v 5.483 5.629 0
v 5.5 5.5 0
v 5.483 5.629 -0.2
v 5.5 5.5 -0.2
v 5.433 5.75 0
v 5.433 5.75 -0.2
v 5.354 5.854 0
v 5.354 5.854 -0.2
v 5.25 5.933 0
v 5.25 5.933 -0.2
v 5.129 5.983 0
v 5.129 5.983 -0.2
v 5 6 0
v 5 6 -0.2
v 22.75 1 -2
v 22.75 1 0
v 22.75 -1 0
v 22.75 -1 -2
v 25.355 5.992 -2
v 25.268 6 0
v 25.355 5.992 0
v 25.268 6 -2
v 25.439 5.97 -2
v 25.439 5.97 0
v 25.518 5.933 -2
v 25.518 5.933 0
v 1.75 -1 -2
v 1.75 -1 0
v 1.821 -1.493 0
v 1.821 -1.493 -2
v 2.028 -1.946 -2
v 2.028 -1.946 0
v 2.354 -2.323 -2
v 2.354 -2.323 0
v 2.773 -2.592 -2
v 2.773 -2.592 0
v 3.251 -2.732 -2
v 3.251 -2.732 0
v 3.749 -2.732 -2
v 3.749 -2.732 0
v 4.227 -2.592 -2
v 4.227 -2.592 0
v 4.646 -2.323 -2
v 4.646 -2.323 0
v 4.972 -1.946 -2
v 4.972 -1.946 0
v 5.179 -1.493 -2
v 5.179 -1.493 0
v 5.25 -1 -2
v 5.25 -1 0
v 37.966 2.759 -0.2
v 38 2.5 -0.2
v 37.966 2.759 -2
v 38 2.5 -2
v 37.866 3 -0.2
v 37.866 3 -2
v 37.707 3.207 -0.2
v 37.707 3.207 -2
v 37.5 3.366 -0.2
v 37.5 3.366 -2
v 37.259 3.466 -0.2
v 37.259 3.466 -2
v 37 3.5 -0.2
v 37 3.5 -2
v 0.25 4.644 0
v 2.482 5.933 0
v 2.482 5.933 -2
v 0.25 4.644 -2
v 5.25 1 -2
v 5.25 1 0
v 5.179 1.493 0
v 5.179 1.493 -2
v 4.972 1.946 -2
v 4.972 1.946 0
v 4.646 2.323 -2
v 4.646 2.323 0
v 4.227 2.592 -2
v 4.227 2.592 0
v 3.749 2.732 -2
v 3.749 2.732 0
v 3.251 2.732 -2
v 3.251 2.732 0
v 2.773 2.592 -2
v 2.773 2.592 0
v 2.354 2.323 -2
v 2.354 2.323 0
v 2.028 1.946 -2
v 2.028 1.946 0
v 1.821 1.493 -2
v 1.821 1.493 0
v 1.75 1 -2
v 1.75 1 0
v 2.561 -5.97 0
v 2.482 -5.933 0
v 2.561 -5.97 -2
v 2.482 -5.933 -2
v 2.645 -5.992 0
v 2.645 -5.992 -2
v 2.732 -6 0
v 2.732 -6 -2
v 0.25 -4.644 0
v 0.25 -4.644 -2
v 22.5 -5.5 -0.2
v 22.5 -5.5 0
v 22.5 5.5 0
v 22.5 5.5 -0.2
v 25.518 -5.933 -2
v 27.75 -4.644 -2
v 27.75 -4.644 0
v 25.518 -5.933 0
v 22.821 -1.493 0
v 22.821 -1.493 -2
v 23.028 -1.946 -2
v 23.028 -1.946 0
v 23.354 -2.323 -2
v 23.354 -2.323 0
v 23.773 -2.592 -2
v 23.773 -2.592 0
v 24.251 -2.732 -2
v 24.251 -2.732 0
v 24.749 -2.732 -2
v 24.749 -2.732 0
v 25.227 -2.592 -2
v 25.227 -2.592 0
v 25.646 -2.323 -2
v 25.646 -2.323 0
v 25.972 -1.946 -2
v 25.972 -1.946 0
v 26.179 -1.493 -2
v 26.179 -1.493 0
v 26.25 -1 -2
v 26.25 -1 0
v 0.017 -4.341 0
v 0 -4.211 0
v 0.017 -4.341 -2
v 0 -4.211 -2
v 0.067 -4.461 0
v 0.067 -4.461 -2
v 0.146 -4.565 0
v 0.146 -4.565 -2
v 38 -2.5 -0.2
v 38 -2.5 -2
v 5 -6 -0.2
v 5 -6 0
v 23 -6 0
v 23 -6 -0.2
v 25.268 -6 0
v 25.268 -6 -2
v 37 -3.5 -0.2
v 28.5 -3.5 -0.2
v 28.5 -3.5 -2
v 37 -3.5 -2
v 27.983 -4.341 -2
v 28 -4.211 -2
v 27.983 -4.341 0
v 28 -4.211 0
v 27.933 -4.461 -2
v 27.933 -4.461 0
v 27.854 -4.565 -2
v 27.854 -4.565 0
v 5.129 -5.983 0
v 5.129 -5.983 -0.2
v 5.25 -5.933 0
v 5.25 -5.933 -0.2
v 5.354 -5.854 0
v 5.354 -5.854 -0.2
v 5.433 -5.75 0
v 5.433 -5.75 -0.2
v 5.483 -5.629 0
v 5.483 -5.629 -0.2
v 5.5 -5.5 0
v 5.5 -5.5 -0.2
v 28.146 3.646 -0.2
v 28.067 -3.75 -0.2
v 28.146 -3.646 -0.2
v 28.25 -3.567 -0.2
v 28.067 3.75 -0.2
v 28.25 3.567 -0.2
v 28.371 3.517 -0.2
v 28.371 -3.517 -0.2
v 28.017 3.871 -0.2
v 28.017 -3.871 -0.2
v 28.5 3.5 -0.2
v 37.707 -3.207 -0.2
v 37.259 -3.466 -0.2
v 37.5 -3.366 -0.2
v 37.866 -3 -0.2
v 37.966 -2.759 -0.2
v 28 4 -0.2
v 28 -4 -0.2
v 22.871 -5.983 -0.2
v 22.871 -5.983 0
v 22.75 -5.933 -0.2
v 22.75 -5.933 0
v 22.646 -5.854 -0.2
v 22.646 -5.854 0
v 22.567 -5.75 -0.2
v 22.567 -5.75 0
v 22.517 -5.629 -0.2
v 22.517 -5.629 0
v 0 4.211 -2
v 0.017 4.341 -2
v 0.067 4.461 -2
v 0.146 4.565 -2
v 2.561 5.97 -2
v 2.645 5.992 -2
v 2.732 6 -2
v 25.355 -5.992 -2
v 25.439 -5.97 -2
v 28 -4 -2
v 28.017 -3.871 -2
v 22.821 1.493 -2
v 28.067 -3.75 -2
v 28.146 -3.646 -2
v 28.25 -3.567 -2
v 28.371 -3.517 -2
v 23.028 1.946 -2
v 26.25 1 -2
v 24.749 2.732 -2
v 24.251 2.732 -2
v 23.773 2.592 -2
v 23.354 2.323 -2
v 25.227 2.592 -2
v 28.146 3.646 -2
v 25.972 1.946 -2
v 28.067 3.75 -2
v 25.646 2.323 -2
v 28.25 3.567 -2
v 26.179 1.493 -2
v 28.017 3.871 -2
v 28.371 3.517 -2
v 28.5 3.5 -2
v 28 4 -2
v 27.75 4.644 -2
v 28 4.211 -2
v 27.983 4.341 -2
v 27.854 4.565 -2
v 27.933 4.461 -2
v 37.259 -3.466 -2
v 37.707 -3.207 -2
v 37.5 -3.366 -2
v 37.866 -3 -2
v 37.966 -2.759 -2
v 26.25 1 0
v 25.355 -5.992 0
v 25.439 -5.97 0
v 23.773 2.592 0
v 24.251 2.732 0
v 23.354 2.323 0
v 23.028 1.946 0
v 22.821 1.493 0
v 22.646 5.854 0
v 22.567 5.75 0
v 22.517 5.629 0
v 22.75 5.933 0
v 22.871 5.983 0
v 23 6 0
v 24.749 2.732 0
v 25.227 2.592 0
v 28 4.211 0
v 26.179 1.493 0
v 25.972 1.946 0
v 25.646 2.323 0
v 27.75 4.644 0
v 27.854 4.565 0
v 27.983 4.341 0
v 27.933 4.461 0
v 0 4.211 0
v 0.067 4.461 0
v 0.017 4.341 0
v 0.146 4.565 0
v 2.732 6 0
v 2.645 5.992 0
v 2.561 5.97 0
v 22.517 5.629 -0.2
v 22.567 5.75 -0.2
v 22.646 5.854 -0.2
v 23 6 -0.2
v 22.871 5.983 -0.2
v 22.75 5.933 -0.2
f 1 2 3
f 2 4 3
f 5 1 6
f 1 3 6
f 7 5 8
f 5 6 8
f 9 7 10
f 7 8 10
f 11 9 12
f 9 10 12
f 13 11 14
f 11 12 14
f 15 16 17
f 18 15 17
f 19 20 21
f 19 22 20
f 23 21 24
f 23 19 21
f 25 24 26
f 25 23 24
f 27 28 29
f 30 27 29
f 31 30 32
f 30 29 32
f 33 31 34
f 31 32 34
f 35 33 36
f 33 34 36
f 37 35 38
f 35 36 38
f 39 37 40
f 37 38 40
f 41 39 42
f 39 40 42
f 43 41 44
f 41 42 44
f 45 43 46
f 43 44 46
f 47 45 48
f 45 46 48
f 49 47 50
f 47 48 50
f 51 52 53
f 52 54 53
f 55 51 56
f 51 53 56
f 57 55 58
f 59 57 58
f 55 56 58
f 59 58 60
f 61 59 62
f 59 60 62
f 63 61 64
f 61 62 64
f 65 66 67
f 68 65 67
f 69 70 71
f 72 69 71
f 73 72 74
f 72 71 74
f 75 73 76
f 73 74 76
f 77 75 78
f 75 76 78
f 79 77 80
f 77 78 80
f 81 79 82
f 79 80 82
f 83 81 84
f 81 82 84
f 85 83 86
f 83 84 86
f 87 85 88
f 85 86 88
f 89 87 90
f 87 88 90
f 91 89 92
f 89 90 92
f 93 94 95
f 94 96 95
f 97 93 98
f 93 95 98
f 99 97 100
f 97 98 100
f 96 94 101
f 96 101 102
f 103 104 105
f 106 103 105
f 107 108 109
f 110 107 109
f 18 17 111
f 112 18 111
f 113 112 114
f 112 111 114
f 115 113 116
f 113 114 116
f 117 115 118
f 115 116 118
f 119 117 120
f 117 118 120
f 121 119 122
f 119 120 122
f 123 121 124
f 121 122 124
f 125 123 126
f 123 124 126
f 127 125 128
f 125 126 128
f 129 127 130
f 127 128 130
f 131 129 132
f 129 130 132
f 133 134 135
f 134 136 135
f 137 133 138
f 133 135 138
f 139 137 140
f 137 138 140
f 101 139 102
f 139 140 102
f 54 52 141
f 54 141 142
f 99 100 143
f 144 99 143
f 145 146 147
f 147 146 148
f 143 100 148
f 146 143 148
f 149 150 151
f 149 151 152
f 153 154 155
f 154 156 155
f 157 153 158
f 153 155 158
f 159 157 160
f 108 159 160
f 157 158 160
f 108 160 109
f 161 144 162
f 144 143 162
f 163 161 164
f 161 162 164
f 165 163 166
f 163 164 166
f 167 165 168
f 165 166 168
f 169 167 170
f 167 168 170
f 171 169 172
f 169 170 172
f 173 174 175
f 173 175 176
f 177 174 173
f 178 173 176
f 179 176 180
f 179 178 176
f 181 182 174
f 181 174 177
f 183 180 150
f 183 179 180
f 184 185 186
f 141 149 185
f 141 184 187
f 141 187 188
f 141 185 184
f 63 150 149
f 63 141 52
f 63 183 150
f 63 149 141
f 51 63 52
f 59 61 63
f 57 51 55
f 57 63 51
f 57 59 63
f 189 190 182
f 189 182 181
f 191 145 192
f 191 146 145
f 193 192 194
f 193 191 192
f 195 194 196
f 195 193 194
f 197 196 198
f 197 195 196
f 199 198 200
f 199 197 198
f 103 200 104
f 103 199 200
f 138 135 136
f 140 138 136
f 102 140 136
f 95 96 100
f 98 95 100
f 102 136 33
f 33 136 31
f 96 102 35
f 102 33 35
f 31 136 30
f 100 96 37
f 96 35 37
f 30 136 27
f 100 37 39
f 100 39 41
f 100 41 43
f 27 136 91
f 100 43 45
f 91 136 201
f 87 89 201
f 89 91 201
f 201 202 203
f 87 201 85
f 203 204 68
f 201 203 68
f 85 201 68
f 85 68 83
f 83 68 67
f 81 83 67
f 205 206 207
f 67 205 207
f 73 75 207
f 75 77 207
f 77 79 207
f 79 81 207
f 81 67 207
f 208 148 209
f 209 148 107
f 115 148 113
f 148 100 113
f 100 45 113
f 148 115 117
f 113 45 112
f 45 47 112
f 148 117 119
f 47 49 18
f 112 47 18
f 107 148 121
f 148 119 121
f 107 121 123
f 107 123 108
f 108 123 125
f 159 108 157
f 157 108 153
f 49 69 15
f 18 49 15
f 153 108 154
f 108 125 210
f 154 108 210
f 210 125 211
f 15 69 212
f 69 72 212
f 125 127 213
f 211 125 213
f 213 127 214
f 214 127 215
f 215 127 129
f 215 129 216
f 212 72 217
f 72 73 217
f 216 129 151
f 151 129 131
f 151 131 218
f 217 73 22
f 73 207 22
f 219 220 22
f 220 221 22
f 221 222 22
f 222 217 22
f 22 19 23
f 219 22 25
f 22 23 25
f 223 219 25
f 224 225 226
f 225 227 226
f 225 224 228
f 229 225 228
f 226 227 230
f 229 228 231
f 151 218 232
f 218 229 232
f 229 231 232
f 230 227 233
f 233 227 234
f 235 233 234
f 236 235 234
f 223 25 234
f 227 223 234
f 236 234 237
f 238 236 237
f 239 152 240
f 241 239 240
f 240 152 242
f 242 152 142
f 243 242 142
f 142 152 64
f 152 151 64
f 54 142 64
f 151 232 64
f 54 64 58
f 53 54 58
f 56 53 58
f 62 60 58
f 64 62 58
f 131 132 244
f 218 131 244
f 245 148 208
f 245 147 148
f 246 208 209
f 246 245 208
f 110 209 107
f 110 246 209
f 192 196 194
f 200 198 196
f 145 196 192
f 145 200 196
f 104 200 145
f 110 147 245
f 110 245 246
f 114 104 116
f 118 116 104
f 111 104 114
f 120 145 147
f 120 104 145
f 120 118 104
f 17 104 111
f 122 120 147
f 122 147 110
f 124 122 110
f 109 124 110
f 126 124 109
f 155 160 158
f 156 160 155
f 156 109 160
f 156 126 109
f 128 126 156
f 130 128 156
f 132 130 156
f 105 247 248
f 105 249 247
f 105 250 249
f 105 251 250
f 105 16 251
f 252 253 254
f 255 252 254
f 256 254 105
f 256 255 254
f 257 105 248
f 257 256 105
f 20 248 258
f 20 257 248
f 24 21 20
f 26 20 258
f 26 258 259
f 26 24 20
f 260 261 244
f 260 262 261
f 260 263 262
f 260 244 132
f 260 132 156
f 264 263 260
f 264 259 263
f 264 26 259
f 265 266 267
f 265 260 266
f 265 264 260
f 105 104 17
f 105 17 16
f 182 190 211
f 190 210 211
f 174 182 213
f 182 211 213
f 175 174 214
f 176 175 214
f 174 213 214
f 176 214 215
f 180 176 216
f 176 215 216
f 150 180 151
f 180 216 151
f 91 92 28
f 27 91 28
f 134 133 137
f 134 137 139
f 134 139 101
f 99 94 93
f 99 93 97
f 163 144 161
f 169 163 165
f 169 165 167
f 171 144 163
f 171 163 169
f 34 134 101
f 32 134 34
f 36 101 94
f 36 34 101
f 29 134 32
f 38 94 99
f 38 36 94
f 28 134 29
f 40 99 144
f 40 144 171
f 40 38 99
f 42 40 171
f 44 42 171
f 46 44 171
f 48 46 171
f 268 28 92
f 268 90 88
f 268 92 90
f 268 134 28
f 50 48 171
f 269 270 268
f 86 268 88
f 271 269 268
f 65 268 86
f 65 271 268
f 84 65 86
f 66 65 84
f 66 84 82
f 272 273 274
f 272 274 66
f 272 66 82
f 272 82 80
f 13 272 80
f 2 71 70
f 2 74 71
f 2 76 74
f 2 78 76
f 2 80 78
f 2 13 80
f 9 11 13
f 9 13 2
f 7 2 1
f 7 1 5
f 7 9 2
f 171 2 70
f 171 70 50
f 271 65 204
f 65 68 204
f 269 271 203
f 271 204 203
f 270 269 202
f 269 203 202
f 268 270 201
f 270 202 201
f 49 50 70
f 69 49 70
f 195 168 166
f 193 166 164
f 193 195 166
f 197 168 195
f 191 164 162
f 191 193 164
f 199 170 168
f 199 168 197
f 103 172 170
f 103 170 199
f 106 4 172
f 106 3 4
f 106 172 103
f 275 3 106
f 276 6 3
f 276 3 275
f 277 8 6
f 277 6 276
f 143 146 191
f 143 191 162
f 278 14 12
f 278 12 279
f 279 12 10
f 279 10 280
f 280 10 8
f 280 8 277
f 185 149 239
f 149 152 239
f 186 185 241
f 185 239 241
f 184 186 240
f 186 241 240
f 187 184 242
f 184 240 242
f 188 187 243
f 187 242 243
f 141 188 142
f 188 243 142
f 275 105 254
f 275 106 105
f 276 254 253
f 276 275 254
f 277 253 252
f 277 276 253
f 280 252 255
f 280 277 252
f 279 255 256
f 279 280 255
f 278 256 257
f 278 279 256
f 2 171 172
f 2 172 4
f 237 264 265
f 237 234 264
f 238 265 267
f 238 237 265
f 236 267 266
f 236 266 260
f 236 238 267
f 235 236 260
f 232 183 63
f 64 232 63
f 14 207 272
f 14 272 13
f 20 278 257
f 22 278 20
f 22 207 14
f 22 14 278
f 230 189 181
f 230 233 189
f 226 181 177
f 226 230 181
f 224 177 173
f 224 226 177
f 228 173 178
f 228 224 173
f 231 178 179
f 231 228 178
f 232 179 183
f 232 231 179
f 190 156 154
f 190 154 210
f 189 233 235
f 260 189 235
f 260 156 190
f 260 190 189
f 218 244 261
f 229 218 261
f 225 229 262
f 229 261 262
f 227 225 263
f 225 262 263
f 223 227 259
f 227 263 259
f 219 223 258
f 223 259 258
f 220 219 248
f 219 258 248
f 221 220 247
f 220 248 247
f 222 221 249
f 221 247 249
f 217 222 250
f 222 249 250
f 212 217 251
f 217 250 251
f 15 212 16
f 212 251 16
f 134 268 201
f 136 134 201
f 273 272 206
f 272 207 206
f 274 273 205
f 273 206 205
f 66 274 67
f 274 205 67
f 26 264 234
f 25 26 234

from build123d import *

# Parameters (mm, degrees)
CROQUIS4_W                   = 38
CROQUIS4_H                   = 2
SALIENTE_EXTRUIR1_DEPTH      = 6
SALIENTE_EXTRUIR1_DEPTH_BACK = 6
CROQUIS1_W                   = 10
CROQUIS1_H                   = 2.5
CORTAR_EXTRUIR2_DEPTH        = 10
CROQUIS5_W                   = 17
CROQUIS5_H                   = 12
CROQUIS5_W_2                 = 10
CORTAR_EXTRUIR3_DEPTH        = 0.2
REDONDEO1_R                  = 0.5
REDONDEO2_R                  = 0.5
REDONDEO4_R                  = 1
CHAFL_N1_SIZE                = 1.5
CHAFL_N1_SIZE2               = 2.598076211
CHAFL_N1_PART_2_SIZE         = 1.5
CHAFL_N1_PART_2_SIZE2        = 2.598076211
REDONDEO5_R                  = 0.5


with BuildPart() as part:
    # Croquis4 → Saliente-Extruir1 (new body, two sides)
    with BuildSketch(Plane(origin=(0, 0, 0), x_dir=(1, 0, 0), z_dir=(0, 1, 0))) as saliente_extruir1_sk:
        with Locations((19, 1)):
            Rectangle(CROQUIS4_W, CROQUIS4_H)
    extrude(amount=SALIENTE_EXTRUIR1_DEPTH)
    extrude(saliente_extruir1_sk.sketch, amount=-SALIENTE_EXTRUIR1_DEPTH_BACK)

    # Croquis1 → Cortar-Extruir2 (cut)
    with BuildSketch(Plane.XY):
        with Locations((33, 4.75)):
            Rectangle(CROQUIS1_W, CROQUIS1_H)
        with Locations((33, -4.75)):
            Rectangle(CROQUIS1_W, CROQUIS1_H)
        with BuildLine():
            Line((5.25, -1), (5.25, 1))
            ThreePointArc((5.25, 1), (3.5, 2.75), (1.75, 1))
            Line((1.75, 1), (1.75, -1))
            ThreePointArc((1.75, -1), (3.5, -2.75), (5.25, -1))
        make_face()
        with BuildLine():
            Line((22.75, 1), (22.75, -1))
            ThreePointArc((22.75, -1), (24.5, -2.75), (26.25, -1))
            Line((26.25, -1), (26.25, 1))
            ThreePointArc((26.25, 1), (24.5, 2.75), (22.75, 1))
        make_face()
    extrude(amount=-CORTAR_EXTRUIR2_DEPTH, mode=Mode.SUBTRACT)

    # Croquis5 → Cortar-Extruir3 (cut)
    with BuildSketch(Plane.XY):
        with Locations((14, 0)):
            Rectangle(CROQUIS5_W, CROQUIS5_H)
        with Locations((33, 0)):
            Rectangle(CROQUIS5_W_2, CROQUIS5_H)
    extrude(amount=-CORTAR_EXTRUIR3_DEPTH, mode=Mode.SUBTRACT)

    # Redondeo1
    redondeo1_edges = [part.edges().sort_by_distance(p)[0] for p in [
        (28, 3.5, -1.1),
        (28, -3.5, -1.1),
    ]]
    fillet(redondeo1_edges, radius=REDONDEO1_R)

    # Redondeo2
    redondeo2_edges = [part.edges().sort_by_distance(p)[0] for p in [
        (22.5, 6, -0.1),
        (22.5, -6, -0.1),
        (5.5, -6, -0.1),
        (5.5, 6, -0.1),
    ]]
    fillet(redondeo2_edges, radius=REDONDEO2_R)

    # Redondeo4
    redondeo4_edges = [part.edges().sort_by_distance(p)[0] for p in [
        (38, 3.5, -1.1),
        (38, -3.5, -1.1),
    ]]
    fillet(redondeo4_edges, radius=REDONDEO4_R)

    # Chaflán1
    chafl_n1_edges = [part.edges().sort_by_distance(p)[0] for p in [
        (0, -6, -1),
        (0, 6, -1),
    ]]
    chafl_n1_side = [part.faces().sort_by_distance(p)[0] for p in [
        (0, 0, -1),
    ]]
    chamfer(chafl_n1_edges, length=CHAFL_N1_SIZE, length2=CHAFL_N1_SIZE2, reference=chafl_n1_side[0])

    # Chaflán1 part 2
    chafl_n1_part_2_edges = [part.edges().sort_by_distance(p)[0] for p in [
        (28, 6, -1),
        (28, -6, -1),
    ]]
    chafl_n1_part_2_side = [part.faces().sort_by_distance(p)[0] for p in [
        (28, 5, -1.878344749),
    ]]
    chamfer(chafl_n1_part_2_edges, length=CHAFL_N1_PART_2_SIZE, length2=CHAFL_N1_PART_2_SIZE2, reference=chafl_n1_part_2_side[0])

    # Redondeo5
    redondeo5_edges = [part.edges().sort_by_distance(p)[0] for p in [
        (25.401923789, 6, -1),
        (2.598076211, 6, -1),
        (0, -4.5, -1),
        (0, 4.5, -1),
        (25.401923789, -6, -1),
        (2.598076211, -6, -1),
        (28, -4.5, -1),
        (28, 4.5, -1),
    ]]
    fillet(redondeo5_edges, radius=REDONDEO5_R)


solid = part.part
